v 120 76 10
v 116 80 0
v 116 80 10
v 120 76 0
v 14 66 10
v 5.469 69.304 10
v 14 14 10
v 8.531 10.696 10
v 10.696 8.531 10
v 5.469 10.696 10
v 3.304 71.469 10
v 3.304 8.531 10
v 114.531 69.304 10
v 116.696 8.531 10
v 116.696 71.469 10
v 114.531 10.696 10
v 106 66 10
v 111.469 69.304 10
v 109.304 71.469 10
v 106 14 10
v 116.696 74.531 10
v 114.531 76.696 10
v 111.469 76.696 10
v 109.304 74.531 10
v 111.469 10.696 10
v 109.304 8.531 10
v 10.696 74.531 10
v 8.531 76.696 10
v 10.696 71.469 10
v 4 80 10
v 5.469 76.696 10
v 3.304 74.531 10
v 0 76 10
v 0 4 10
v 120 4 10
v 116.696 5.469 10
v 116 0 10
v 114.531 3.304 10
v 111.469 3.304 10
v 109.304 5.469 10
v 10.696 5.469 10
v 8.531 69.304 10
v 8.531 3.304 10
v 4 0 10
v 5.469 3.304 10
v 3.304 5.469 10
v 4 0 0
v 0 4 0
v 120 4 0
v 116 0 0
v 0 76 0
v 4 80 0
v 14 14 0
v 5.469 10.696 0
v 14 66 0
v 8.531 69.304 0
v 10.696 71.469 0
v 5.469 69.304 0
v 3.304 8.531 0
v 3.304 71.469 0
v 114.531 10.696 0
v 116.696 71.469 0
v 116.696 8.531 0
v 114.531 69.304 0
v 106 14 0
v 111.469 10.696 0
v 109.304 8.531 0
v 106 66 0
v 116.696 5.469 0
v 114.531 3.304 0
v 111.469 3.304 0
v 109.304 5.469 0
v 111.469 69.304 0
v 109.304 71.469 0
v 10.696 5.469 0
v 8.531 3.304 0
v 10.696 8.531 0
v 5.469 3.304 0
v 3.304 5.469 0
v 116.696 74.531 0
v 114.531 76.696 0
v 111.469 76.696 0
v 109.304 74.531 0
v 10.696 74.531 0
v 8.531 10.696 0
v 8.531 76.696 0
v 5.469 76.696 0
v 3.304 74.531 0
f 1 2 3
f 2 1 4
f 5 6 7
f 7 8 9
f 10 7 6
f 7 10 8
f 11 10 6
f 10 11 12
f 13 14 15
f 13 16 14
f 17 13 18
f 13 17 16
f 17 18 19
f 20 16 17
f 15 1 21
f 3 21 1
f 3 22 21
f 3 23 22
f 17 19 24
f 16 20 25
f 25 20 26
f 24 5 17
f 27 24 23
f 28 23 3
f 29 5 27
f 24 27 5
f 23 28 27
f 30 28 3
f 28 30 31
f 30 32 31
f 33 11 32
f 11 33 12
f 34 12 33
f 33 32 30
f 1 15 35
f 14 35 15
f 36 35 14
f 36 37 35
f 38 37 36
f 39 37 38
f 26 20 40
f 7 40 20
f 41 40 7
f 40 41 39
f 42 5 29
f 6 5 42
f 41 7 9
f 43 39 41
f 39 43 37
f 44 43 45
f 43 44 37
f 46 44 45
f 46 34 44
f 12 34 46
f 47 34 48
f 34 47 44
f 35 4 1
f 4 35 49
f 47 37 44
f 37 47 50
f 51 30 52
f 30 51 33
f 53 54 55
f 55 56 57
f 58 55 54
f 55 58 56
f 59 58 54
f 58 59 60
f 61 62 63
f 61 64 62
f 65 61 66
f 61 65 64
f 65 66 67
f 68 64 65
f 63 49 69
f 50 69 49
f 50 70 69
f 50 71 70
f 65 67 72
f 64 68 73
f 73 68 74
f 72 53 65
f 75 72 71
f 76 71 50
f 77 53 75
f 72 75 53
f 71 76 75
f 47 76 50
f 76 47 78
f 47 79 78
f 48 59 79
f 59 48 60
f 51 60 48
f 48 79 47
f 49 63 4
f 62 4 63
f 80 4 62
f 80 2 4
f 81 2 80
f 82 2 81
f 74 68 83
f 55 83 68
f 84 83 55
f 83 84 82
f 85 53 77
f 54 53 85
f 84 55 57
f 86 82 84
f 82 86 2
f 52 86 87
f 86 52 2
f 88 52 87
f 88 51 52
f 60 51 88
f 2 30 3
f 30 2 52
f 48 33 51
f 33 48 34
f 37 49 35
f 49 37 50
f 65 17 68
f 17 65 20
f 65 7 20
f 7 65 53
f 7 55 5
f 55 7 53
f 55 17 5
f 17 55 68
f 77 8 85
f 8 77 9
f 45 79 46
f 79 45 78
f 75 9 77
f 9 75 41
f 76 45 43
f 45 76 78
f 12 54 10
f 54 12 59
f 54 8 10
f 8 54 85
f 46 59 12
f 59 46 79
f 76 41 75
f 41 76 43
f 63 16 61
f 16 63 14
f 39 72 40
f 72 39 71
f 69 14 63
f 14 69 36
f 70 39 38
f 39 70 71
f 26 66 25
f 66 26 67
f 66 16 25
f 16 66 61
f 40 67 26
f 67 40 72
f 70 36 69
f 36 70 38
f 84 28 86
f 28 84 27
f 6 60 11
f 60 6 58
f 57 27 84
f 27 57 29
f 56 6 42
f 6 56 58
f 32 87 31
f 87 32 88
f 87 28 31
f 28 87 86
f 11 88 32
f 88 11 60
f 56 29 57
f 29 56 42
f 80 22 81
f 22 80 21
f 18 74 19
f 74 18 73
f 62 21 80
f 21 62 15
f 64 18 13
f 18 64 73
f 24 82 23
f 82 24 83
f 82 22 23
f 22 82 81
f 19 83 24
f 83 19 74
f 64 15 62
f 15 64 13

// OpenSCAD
$fn = 32;

// ----------------------------------------------------------------------
// Frame plate: 120 x 80 frame, 14 mm rails
// ----------------------------------------------------------------------

// --- parameters (mm) ---
plate_l = 120;            // plate length, X
plate_w = 80;             // plate width, Y
plate_t = 10;             // plate thickness, Z (extrusion height)
corner_c = 4;             // corner chamfer
frame_bar = 14;           // frame rail width
bolt_r = 4;               // corner bolt window radius
bolt_inset = 7;           // bolt centre inset from the edges
fit_tol = 0.1;            // declared fit tolerance (prompt contract)
free_tol = 0.3;           // declared free tolerance (prompt contract)

win_l = plate_l - 2 * frame_bar;  // window length
win_w = plate_w - 2 * frame_bar;  // window width
bolt_d = 2 * bolt_r;  // corner hole diameter

profile = [[4, 0], [116, 0], [120, 4], [120, 76], [116, 80], [4, 80], [0, 76], [0, 4]];  // primary outline, 8 points, counter clockwise
void_1 = [[14, 14], [106, 14], [106, 66], [14, 66]];  // the window, 4 points
void_2 = [[10.696, 8.531], [8.531, 10.696], [5.469, 10.696], [3.304, 8.531], [3.304, 5.469], [5.469, 3.304], [8.531, 3.304], [10.696, 5.469]];  // corner bolt window, 8 points
void_3 = [[116.696, 8.531], [114.531, 10.696], [111.469, 10.696], [109.304, 8.531], [109.304, 5.469], [111.469, 3.304], [114.531, 3.304], [116.696, 5.469]];  // corner bolt window, 8 points
void_4 = [[10.696, 74.531], [8.531, 76.696], [5.469, 76.696], [3.304, 74.531], [3.304, 71.469], [5.469, 69.304], [8.531, 69.304], [10.696, 71.469]];  // corner bolt window, 8 points
void_5 = [[116.696, 74.531], [114.531, 76.696], [111.469, 76.696], [109.304, 74.531], [109.304, 71.469], [111.469, 69.304], [114.531, 69.304], [116.696, 71.469]];  // corner bolt window, 8 points

// --- the one profile operation ---
difference() {
  linear_extrude(height = plate_t) polygon(points = profile);
  translate([0, 0, -1])
    linear_extrude(height = plate_t + 2) polygon(points = void_1);
  translate([0, 0, -1])
    linear_extrude(height = plate_t + 2) polygon(points = void_2);
  translate([0, 0, -1])
    linear_extrude(height = plate_t + 2) polygon(points = void_3);
  translate([0, 0, -1])
    linear_extrude(height = plate_t + 2) polygon(points = void_4);
  translate([0, 0, -1])
    linear_extrude(height = plate_t + 2) polygon(points = void_5);
}
